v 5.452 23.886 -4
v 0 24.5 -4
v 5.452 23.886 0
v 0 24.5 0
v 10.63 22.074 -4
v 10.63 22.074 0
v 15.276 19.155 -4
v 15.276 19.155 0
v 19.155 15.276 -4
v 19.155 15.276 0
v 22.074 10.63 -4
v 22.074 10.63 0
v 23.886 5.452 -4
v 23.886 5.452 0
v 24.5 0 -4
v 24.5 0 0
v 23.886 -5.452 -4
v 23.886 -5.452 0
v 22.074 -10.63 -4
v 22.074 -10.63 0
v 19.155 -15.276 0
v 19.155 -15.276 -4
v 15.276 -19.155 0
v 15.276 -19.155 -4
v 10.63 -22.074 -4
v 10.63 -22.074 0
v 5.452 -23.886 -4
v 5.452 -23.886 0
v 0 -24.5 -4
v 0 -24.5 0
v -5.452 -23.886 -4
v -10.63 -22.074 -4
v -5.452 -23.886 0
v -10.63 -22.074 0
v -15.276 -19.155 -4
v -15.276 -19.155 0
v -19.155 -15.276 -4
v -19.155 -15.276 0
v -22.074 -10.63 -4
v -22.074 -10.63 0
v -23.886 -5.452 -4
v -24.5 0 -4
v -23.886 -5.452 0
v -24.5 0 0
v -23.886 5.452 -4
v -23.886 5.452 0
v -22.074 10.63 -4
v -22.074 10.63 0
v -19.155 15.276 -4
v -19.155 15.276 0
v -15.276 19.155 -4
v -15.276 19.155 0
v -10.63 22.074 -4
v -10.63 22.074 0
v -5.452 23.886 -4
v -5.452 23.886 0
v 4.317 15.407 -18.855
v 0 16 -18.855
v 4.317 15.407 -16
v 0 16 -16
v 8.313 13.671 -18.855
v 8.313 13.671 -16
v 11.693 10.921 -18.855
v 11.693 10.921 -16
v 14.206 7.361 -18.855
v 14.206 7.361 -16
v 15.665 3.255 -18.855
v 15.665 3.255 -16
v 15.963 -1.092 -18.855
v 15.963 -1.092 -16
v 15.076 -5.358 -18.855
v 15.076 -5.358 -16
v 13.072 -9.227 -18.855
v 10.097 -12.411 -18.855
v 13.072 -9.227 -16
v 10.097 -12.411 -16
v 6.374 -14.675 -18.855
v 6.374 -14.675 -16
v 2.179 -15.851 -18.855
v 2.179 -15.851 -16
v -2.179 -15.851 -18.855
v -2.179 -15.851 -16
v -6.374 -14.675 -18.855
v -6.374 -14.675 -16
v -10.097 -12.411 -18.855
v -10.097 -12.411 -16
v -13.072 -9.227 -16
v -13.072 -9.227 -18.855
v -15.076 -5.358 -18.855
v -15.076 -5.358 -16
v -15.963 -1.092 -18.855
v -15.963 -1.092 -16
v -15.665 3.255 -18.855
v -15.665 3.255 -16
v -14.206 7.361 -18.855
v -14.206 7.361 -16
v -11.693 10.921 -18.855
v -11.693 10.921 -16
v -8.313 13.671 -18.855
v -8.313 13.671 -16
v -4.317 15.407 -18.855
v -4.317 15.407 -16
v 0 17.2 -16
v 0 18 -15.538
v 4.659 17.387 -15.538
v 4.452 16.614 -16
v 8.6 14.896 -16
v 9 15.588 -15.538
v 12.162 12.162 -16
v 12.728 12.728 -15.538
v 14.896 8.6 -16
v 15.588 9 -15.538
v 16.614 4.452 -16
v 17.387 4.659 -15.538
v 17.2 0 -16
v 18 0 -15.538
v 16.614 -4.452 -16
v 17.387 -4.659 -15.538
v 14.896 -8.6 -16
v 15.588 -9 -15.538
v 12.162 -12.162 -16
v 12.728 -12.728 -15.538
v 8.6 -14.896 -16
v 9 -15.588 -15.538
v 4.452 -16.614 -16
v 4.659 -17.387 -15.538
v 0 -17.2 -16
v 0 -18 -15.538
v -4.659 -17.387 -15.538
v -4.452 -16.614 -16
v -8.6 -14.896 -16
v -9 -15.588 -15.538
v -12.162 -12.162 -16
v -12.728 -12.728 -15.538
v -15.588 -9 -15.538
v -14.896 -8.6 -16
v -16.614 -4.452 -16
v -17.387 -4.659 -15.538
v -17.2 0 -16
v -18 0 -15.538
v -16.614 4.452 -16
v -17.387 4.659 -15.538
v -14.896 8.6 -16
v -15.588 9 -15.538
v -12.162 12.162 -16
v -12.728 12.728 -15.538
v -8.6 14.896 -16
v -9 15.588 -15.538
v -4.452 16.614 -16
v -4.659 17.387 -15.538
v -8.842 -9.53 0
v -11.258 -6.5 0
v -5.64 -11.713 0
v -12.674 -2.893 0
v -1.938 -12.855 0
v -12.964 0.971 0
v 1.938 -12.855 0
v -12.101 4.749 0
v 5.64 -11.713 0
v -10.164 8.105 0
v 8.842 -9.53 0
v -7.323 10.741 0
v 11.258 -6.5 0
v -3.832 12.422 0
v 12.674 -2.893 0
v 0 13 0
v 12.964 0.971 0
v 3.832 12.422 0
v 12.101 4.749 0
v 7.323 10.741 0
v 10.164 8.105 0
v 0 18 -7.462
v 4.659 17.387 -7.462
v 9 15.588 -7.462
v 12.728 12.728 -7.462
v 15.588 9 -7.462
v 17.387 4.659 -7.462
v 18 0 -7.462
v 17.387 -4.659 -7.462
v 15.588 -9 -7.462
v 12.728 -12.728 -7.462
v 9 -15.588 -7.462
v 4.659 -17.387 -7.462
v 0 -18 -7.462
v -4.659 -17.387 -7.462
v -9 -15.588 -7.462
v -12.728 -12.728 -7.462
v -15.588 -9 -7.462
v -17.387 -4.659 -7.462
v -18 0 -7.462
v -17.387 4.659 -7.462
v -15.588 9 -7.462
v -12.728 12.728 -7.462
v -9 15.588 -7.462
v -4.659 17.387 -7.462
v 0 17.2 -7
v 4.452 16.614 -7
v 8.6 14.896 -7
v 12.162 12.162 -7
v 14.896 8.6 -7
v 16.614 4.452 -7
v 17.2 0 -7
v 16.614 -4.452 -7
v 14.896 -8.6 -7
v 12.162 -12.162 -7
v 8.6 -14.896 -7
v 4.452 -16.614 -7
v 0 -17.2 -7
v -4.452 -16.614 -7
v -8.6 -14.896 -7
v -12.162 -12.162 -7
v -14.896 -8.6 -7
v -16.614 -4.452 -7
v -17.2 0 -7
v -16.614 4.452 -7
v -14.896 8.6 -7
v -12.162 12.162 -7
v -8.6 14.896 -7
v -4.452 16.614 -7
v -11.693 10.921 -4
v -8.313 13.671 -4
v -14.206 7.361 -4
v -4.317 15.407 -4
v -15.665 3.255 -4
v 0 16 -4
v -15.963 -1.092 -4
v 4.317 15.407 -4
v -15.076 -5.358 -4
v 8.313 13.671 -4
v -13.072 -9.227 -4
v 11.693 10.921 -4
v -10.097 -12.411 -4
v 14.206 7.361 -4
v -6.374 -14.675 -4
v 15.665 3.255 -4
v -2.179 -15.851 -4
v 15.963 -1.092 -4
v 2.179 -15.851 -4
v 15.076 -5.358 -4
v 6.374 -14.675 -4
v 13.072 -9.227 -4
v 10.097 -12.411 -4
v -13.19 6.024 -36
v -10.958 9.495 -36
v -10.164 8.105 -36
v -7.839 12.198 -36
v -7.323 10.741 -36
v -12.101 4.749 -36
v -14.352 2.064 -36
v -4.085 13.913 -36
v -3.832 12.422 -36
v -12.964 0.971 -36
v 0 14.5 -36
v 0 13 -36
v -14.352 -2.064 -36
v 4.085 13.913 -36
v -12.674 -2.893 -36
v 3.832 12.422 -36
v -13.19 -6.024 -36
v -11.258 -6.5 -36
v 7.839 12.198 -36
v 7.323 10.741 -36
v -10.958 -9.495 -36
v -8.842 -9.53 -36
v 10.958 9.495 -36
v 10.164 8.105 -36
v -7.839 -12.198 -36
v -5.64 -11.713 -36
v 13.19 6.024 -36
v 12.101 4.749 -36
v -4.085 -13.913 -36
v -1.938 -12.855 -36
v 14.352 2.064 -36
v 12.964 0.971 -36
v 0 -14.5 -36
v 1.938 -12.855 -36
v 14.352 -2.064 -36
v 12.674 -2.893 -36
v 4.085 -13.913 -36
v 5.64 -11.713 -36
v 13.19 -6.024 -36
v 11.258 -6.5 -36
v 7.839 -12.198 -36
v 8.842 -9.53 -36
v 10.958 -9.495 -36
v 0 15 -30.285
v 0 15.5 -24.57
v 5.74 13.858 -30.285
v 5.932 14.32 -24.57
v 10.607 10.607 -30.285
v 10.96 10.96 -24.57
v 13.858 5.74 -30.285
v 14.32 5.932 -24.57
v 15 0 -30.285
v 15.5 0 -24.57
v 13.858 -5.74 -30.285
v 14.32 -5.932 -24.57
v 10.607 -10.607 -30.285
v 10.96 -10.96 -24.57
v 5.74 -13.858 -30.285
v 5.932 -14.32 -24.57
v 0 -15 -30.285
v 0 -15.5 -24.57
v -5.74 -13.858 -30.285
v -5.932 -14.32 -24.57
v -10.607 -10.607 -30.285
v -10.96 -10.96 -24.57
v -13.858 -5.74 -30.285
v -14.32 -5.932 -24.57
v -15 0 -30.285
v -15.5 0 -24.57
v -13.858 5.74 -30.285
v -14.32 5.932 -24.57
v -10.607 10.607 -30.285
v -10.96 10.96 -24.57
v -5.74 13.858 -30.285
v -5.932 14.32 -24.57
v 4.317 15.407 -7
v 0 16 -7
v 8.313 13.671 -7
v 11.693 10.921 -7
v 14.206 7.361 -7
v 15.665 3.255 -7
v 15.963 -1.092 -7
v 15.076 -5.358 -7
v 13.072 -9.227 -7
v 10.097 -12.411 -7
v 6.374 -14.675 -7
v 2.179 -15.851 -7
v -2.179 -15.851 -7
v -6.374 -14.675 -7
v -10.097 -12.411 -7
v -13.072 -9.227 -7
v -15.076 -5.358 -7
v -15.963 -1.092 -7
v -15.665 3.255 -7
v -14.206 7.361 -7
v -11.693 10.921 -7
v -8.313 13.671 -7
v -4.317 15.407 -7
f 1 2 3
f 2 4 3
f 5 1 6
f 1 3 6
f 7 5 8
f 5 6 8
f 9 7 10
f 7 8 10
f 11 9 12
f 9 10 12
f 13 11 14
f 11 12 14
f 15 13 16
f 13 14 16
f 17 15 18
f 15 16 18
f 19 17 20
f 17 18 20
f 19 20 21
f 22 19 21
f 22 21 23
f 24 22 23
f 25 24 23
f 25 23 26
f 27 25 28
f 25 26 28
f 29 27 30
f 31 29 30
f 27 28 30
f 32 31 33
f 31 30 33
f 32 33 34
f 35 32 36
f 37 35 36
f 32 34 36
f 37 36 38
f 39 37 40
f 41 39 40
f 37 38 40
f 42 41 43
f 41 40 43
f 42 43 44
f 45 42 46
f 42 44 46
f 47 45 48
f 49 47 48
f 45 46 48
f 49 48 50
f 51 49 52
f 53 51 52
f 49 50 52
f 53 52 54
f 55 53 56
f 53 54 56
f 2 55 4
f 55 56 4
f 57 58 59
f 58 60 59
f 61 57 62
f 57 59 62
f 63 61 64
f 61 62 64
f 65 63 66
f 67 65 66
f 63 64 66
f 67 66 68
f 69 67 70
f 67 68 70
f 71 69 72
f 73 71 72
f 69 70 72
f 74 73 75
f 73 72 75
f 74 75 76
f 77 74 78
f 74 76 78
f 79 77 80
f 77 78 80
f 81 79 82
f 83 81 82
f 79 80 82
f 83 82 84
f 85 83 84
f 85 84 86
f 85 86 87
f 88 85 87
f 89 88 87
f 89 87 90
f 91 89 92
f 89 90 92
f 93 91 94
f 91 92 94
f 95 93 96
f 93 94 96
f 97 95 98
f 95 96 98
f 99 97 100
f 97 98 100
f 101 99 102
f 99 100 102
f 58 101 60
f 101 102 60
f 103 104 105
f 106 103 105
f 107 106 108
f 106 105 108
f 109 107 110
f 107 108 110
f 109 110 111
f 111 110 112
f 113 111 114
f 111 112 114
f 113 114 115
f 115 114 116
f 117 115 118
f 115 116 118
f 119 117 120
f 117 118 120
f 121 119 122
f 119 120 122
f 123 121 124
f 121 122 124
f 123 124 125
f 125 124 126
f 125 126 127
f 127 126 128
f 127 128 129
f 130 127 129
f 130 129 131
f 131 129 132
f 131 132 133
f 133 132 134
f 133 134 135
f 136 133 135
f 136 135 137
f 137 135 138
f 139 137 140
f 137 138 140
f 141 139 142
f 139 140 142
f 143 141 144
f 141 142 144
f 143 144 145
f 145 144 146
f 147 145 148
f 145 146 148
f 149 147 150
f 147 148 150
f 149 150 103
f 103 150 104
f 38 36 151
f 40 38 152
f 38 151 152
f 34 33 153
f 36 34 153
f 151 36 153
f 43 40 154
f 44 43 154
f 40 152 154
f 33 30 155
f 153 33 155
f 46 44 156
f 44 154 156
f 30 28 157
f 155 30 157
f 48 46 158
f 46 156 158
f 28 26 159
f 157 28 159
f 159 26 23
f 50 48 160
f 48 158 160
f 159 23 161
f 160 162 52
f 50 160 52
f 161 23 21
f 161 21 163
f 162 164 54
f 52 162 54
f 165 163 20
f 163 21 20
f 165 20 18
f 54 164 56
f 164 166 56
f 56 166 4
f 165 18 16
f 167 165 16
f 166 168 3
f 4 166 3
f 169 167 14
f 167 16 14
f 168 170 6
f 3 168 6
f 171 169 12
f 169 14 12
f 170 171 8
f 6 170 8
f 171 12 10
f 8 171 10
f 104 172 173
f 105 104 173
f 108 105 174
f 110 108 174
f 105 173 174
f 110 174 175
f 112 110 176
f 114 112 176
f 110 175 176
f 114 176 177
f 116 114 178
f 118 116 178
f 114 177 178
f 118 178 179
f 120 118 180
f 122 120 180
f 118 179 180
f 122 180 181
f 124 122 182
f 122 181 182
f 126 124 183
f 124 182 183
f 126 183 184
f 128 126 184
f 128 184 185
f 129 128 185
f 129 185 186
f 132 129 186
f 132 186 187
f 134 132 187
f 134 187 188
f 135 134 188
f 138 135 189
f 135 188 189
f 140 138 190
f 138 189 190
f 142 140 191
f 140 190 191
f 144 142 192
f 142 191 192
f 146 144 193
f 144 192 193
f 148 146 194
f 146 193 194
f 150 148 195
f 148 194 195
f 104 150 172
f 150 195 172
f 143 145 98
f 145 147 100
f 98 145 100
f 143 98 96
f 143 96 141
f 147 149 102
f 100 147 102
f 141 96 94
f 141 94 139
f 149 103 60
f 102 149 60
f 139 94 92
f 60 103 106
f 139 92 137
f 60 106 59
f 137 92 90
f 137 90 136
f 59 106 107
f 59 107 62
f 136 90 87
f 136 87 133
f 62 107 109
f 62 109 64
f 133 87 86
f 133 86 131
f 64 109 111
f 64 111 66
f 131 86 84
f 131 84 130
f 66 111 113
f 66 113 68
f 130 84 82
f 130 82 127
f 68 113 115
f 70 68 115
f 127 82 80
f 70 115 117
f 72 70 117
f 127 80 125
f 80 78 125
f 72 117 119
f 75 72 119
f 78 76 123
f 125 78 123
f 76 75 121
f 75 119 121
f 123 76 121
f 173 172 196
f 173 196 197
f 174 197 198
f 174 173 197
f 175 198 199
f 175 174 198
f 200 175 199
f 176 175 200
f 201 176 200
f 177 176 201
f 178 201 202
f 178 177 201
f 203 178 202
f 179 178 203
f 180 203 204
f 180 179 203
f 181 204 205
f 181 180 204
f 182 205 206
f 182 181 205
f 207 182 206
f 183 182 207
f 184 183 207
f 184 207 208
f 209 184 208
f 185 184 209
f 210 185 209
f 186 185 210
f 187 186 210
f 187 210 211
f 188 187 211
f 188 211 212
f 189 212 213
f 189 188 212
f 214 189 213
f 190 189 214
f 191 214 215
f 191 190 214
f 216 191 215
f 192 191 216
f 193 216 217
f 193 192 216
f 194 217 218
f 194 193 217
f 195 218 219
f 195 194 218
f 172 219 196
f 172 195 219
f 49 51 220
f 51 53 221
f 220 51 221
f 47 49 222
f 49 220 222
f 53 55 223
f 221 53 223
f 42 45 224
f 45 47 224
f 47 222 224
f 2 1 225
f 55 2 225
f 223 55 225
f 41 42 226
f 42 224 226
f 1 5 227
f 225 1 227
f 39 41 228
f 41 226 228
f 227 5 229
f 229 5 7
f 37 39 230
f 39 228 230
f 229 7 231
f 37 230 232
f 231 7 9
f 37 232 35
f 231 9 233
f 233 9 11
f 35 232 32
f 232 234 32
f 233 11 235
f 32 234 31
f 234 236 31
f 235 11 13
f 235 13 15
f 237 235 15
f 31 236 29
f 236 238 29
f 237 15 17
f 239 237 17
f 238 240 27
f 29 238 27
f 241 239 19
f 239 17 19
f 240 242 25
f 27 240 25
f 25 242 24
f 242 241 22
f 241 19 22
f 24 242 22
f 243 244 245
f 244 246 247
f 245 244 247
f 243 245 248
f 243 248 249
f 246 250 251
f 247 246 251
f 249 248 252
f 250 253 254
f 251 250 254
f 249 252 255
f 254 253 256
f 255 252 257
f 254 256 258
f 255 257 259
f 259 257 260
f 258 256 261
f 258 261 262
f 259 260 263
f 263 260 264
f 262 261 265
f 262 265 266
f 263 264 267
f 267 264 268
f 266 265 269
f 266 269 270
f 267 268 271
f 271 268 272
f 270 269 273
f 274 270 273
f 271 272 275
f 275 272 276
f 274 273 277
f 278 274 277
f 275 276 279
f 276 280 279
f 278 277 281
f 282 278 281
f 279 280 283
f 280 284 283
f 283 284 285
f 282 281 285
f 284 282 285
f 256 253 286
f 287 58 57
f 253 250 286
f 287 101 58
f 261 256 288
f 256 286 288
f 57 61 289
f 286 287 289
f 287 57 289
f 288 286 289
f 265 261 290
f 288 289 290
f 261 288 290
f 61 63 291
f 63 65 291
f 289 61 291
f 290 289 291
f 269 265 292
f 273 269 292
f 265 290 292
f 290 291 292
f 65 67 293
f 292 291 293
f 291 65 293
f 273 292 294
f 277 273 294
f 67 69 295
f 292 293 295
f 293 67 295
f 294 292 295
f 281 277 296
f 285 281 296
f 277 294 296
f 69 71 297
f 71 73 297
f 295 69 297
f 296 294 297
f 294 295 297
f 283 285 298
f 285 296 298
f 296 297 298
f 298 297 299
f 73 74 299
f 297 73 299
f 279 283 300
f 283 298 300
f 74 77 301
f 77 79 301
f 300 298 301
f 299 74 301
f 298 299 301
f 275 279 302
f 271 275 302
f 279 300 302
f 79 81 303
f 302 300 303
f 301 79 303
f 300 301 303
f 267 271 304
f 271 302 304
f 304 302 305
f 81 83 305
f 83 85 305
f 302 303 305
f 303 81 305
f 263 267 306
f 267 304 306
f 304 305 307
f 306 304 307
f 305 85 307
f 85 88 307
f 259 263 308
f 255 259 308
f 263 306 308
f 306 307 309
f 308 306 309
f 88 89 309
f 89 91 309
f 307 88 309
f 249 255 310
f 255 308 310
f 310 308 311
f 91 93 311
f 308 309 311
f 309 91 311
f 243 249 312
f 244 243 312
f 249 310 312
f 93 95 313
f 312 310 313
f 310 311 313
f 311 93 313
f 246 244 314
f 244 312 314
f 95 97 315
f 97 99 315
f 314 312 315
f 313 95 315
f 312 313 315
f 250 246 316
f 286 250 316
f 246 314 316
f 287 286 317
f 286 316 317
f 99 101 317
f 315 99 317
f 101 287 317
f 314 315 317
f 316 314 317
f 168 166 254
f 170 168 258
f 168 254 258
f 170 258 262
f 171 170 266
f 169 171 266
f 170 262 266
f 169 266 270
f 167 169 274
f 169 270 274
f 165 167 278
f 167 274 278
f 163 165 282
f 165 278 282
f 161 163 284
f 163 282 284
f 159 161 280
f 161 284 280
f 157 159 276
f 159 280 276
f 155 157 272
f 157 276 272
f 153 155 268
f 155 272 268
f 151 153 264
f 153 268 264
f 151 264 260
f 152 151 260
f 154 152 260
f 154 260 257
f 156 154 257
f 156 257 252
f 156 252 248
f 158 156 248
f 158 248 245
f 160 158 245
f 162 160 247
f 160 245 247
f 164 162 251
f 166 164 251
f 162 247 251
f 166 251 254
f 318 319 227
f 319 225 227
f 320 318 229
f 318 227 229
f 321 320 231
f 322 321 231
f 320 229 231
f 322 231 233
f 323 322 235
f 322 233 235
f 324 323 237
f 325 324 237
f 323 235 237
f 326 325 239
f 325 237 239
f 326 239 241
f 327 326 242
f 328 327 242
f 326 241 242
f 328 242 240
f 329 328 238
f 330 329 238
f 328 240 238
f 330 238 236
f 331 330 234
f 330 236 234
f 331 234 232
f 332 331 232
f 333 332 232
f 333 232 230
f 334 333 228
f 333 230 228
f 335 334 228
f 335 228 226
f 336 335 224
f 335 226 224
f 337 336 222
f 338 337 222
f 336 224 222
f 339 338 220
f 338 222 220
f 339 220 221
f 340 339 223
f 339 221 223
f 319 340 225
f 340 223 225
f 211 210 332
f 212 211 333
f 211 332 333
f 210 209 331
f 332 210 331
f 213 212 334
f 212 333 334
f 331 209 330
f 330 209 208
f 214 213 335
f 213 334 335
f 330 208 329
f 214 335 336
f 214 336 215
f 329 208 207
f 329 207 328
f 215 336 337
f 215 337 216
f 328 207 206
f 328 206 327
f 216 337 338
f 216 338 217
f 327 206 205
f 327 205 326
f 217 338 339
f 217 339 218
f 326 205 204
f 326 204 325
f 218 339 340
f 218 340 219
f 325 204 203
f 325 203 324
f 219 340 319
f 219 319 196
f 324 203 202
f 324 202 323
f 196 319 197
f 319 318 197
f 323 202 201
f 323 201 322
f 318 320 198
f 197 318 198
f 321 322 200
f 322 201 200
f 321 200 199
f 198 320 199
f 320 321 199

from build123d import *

# Parameters (mm, degrees)
CHAMFER_1_SIZE         = 0.8
CHAMFER_1_SIZE2        = 0.461880215
CHAMFER_1_PART_2_SIZE  = 0.8
CHAMFER_1_PART_2_SIZE2 = 0.461880215


with BuildPart() as part:
    # Эскиз1 → Повернуть1 (revolve)
    with BuildSketch(Plane(origin=(0, 0, 0), x_dir=(0, 0, -1), z_dir=(1, 0, 0))):
        Polygon((0, 13), (36, 13), (36, 14.5), (18.854921546, 16), (16, 16), (16, 18), (7, 18), (7, 16), (4, 16), (4, 24.5), (0, 24.5), align=None)
    revolve(axis=Axis((0, 0, 0), (0, 0, -1)))

    # Фаска1
    chamfer_1_edges = [part.edges().sort_by_distance(p)[0] for p in [
        (0, -18, -7),
    ]]
    chamfer_1_side = [part.faces().sort_by_distance(p)[0] for p in [
        (0, -17.490883118, -7),
    ]]
    chamfer(chamfer_1_edges, length=CHAMFER_1_SIZE, length2=CHAMFER_1_SIZE2, reference=chamfer_1_side[0])

    # Фаска1 part 2
    chamfer_1_part_2_edges = [part.edges().sort_by_distance(p)[0] for p in [
        (0, -18, -16),
    ]]
    chamfer_1_part_2_side = [part.faces().sort_by_distance(p)[0] for p in [
        (0, -16.509116882, -16),
    ]]
    chamfer(chamfer_1_part_2_edges, length=CHAMFER_1_PART_2_SIZE, length2=CHAMFER_1_PART_2_SIZE2, reference=chamfer_1_part_2_side[0])


solid = part.part
